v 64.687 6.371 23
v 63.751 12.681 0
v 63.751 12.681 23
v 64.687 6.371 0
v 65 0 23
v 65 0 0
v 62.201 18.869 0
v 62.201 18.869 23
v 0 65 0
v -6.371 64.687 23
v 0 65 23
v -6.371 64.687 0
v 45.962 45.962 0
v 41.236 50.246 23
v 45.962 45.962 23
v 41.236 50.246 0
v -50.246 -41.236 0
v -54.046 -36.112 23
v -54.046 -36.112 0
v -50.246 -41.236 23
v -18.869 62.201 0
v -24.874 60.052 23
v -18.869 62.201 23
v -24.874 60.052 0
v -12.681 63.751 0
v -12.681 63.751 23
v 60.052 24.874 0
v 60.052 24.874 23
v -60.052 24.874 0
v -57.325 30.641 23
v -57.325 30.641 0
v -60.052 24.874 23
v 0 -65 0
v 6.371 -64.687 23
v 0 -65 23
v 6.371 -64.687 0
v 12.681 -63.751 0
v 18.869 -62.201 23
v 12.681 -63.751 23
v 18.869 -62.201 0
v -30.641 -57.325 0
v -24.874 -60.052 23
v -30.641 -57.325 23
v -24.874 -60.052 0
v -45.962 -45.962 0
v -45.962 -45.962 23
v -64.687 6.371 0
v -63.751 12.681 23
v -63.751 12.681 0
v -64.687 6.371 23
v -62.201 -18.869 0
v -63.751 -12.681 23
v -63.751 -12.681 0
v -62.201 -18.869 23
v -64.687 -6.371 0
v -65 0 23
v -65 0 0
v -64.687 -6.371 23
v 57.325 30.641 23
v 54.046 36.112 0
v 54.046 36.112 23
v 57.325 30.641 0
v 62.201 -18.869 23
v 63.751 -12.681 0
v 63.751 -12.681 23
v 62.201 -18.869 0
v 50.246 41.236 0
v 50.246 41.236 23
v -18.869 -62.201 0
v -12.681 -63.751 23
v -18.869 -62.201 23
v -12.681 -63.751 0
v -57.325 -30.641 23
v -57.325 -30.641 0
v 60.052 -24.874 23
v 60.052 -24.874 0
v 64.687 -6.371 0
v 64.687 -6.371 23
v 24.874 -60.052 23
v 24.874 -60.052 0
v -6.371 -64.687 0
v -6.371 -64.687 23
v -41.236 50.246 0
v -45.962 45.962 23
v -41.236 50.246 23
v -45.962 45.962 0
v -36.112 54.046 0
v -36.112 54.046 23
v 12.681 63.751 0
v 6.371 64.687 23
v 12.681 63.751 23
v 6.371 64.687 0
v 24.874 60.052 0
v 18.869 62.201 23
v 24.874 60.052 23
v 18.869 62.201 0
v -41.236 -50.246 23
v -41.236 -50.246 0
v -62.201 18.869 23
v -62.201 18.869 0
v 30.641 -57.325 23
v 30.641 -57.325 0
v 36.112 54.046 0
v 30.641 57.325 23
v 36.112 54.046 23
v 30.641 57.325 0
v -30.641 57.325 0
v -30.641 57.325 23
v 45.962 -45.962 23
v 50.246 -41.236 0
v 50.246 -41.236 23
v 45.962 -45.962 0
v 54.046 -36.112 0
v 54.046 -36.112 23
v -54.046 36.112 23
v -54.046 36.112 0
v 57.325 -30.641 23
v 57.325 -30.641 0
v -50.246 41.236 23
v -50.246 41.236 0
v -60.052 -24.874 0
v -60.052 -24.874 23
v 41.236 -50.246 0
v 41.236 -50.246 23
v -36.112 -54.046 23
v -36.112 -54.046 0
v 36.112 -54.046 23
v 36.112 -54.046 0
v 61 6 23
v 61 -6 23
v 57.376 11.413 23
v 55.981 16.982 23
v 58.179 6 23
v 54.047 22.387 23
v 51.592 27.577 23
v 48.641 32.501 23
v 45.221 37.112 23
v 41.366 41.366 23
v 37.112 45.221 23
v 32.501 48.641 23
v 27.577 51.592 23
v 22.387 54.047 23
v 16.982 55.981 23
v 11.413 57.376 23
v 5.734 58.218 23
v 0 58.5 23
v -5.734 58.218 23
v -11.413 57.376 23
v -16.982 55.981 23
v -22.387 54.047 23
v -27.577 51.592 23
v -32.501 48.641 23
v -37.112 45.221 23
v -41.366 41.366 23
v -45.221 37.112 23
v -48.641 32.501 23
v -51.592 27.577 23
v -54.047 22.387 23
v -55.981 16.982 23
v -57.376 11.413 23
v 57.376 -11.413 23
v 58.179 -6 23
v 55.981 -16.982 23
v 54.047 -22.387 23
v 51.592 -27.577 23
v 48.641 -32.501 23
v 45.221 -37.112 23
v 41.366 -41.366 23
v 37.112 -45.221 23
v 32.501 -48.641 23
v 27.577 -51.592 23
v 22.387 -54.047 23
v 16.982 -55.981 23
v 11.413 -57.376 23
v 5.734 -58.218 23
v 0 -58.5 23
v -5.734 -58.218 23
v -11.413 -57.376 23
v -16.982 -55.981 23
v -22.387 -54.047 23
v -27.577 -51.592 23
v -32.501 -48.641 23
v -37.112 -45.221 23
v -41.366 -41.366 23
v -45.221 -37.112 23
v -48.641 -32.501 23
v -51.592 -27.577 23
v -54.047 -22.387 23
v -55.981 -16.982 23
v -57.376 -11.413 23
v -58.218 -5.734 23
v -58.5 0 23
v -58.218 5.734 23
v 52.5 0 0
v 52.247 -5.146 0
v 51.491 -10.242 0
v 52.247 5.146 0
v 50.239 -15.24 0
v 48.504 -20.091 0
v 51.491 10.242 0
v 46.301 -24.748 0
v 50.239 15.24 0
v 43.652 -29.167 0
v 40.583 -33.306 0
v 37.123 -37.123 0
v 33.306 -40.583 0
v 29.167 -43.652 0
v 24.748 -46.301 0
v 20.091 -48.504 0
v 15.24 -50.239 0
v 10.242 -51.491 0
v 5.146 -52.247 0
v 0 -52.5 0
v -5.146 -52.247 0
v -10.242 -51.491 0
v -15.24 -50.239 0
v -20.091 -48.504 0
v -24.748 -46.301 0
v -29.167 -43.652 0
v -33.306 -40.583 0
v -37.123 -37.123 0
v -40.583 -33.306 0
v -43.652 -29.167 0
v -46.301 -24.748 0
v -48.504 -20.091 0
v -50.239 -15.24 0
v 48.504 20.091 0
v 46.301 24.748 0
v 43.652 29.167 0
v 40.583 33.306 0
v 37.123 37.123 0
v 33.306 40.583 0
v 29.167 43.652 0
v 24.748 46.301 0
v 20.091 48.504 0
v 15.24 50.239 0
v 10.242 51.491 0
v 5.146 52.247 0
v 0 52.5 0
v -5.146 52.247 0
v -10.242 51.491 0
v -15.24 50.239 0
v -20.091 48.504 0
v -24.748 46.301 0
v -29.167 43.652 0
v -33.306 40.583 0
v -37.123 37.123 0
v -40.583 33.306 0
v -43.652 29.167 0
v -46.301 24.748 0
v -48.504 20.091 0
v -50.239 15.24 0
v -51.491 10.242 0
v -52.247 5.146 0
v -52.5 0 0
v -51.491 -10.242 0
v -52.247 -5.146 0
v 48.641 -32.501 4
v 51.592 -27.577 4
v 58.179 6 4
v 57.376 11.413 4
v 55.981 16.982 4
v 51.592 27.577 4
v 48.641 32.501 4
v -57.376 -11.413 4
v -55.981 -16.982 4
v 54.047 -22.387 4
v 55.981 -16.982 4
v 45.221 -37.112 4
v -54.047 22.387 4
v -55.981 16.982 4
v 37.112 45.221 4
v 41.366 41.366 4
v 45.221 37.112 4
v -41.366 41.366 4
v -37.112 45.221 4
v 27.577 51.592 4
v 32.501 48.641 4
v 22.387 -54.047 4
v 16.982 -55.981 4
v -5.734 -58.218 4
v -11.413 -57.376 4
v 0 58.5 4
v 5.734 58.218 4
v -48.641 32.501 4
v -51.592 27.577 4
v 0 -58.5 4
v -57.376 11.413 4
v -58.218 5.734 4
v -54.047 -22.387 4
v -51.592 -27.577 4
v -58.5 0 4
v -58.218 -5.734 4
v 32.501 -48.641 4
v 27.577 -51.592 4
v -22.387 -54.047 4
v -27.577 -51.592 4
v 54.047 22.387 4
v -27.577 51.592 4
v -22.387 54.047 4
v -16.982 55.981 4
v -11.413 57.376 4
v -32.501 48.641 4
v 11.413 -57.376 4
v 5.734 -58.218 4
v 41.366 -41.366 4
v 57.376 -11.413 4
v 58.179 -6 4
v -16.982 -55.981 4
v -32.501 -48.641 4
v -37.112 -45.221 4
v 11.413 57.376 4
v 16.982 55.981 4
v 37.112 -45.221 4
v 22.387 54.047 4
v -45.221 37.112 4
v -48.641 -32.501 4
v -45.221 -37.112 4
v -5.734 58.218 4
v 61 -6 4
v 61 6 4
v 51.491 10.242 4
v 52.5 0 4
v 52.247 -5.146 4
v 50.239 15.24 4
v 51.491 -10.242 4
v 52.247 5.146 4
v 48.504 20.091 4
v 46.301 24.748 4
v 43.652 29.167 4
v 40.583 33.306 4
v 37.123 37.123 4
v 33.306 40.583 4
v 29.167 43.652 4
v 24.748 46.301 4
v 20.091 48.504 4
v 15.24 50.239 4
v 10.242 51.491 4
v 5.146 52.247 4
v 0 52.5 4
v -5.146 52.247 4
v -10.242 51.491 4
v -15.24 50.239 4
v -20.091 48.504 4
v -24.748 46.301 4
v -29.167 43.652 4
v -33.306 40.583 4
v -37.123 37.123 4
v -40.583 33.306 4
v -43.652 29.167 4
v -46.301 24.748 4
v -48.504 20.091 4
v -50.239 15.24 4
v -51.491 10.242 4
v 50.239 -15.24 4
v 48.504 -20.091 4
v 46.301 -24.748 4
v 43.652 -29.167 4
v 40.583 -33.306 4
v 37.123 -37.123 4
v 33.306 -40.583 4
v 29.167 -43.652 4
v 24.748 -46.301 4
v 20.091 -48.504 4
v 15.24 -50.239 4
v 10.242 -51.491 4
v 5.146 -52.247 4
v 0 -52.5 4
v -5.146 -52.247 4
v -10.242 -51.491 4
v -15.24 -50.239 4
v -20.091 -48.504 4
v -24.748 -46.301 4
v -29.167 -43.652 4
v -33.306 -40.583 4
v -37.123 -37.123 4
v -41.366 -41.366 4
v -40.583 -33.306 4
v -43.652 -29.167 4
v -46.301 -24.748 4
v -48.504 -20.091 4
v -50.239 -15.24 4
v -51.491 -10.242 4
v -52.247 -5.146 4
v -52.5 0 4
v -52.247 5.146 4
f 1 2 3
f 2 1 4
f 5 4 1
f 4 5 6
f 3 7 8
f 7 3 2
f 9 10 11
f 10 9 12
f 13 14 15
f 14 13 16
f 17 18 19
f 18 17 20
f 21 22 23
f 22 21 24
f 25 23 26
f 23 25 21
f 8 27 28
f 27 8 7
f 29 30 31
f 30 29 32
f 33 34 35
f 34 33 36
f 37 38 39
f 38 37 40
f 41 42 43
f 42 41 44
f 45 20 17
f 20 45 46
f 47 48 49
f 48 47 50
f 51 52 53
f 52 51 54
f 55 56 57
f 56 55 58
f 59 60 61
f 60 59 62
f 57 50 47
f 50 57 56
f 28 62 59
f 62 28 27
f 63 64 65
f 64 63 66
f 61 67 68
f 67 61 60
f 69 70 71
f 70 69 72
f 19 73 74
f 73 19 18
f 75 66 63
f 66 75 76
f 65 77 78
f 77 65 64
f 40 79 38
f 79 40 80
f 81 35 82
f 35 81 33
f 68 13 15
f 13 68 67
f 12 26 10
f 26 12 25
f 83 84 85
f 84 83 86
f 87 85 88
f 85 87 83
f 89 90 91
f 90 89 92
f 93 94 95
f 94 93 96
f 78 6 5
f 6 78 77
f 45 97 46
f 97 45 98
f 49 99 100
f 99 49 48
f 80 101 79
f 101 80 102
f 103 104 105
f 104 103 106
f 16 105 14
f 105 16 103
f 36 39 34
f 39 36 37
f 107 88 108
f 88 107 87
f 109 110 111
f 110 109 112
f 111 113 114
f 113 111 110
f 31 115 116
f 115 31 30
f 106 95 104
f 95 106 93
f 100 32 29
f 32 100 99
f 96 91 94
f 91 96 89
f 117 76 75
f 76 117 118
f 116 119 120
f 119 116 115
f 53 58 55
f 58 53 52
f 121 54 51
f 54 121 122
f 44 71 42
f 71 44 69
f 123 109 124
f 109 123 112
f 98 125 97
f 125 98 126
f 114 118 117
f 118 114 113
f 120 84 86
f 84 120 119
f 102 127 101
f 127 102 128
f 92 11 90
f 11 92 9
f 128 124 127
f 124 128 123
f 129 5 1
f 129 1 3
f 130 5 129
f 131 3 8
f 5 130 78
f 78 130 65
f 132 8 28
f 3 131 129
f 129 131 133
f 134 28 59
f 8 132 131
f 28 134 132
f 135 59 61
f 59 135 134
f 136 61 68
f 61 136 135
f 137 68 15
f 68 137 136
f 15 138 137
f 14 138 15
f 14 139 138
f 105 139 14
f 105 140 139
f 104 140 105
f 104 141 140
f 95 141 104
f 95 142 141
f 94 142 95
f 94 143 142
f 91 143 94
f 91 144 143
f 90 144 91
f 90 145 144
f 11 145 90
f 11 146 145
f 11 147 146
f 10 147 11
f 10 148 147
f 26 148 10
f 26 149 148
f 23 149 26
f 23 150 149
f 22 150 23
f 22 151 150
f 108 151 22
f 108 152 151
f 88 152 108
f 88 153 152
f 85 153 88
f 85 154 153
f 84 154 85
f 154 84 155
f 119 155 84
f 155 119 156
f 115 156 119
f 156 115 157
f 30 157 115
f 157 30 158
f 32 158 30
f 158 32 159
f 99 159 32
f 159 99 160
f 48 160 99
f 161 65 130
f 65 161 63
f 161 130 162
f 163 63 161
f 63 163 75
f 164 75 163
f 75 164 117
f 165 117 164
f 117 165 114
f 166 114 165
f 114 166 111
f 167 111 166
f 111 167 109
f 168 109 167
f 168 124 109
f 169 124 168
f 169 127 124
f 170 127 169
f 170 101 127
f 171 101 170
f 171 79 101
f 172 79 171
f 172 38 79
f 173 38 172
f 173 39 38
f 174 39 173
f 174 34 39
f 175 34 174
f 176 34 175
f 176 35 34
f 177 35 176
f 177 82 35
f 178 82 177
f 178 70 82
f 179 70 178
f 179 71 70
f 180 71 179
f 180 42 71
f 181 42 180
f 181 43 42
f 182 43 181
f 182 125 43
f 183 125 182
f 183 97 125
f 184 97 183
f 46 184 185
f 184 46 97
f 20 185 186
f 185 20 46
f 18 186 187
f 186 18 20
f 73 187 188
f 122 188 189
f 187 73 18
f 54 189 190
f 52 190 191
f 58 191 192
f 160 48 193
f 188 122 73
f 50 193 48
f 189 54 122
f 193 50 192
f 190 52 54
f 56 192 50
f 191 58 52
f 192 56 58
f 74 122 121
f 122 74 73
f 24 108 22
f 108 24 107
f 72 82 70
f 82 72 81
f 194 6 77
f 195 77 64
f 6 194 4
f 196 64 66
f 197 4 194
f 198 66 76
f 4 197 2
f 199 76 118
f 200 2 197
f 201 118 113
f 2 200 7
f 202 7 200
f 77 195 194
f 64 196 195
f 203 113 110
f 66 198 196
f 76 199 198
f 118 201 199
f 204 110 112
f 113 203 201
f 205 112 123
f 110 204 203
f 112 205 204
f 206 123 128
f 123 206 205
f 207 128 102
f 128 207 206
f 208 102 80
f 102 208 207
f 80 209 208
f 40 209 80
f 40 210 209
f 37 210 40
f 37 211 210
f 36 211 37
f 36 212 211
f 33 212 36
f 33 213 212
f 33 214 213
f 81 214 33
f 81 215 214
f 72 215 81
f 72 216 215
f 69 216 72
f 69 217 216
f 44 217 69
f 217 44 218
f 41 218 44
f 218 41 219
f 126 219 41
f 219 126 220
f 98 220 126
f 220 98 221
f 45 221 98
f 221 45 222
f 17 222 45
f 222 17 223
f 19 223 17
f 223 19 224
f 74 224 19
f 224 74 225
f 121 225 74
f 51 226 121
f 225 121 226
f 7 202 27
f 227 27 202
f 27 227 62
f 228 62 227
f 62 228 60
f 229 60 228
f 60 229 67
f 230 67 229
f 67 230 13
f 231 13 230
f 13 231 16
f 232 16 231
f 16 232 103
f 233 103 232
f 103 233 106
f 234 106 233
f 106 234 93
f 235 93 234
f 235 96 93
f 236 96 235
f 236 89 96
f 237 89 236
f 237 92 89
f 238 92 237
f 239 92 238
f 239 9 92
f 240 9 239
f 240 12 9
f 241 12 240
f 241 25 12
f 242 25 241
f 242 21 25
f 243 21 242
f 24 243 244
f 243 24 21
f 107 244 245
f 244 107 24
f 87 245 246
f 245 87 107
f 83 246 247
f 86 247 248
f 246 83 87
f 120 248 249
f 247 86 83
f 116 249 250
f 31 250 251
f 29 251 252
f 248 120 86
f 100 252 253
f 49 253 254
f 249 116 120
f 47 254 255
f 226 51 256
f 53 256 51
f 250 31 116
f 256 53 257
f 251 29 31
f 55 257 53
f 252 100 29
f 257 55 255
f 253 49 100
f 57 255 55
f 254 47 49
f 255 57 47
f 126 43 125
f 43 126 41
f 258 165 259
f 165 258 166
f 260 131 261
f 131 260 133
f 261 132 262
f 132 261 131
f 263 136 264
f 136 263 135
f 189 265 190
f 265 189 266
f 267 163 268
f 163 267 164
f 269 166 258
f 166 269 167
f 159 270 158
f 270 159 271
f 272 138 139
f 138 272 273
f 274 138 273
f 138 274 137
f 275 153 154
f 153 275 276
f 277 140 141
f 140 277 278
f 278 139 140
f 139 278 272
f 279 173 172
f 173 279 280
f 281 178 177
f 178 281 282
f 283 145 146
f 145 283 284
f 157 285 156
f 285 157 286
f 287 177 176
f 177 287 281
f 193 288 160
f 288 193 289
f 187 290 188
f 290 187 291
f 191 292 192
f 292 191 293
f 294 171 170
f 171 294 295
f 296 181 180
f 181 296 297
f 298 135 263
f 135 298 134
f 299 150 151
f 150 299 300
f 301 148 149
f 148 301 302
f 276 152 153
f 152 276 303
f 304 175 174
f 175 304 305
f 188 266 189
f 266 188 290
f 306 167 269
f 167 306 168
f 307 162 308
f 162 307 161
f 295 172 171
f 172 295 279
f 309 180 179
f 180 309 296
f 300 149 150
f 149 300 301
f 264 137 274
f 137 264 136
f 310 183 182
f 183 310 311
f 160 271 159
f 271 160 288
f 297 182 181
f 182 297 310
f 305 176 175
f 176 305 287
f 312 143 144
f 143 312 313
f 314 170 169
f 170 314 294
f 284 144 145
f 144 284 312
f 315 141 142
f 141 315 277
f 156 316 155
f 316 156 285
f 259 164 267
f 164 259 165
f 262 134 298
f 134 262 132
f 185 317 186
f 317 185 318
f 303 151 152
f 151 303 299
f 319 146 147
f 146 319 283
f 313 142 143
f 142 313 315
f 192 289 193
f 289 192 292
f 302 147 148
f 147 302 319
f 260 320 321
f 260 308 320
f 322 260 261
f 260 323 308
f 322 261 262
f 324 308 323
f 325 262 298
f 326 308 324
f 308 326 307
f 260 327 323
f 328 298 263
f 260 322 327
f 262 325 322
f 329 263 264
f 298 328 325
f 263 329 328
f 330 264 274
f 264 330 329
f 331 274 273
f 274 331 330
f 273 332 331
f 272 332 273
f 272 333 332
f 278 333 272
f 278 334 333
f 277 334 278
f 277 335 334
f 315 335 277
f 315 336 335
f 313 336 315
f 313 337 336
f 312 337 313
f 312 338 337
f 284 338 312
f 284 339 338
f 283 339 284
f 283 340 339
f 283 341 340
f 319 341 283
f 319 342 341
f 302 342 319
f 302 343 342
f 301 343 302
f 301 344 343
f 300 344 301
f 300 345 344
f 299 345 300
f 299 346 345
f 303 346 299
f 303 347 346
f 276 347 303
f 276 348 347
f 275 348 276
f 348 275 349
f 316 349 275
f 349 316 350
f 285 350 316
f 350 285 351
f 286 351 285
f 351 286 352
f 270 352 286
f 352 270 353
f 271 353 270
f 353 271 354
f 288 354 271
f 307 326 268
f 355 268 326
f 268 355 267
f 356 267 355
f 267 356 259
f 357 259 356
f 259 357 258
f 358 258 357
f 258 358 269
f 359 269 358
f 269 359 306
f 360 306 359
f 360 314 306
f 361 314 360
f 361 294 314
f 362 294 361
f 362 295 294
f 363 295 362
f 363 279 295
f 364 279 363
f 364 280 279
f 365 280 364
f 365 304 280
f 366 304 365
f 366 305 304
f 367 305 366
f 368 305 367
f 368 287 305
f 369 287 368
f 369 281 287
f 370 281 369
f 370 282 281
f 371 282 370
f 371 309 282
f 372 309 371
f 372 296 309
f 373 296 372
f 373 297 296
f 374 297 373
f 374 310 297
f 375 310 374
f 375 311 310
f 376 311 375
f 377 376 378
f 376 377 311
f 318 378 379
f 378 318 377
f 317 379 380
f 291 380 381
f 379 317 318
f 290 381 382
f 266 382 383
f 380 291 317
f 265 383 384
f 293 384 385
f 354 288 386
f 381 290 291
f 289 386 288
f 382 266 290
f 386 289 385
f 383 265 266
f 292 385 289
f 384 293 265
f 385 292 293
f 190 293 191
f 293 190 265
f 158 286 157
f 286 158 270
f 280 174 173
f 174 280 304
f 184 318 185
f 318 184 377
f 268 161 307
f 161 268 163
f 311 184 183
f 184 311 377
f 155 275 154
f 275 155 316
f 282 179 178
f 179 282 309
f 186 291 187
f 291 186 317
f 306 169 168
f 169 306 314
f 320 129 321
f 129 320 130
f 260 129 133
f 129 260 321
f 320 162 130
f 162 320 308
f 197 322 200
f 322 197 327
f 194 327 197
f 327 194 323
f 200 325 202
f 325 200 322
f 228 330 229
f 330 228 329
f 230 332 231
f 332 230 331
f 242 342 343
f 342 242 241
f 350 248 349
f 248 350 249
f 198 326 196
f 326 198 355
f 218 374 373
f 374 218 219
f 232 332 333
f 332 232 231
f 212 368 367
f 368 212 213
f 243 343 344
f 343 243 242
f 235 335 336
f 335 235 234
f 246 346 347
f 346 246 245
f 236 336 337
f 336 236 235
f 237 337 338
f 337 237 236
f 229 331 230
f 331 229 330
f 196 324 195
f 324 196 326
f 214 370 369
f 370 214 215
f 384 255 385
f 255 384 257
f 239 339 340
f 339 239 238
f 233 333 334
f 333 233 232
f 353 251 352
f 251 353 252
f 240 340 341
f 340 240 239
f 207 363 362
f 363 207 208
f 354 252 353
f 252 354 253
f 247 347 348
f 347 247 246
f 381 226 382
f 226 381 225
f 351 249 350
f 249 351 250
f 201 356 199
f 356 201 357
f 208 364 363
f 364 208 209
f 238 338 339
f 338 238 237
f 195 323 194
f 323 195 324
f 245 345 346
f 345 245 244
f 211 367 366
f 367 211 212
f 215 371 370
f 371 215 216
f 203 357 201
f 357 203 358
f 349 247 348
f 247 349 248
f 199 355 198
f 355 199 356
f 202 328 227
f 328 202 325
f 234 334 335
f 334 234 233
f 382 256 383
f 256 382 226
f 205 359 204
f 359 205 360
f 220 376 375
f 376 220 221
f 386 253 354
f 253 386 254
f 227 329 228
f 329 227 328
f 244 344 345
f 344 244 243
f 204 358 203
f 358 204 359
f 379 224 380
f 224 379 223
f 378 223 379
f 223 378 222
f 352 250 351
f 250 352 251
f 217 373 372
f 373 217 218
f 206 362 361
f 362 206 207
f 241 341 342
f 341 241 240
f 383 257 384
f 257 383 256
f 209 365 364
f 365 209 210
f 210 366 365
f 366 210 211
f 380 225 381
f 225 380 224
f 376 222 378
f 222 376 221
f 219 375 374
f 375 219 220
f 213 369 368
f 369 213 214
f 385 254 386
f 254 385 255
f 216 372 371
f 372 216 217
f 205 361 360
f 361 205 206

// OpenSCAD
$fn=64;
difference(){
    cylinder(d=130, h=23);
    translate([0,0,4])
        cylinder(d=117, h=20);
    translate([117/2-1,-6,4])
        cube([3.5,12,40]);
    translate([0,0,-1])
        cylinder(d=105, h= 6);
}
